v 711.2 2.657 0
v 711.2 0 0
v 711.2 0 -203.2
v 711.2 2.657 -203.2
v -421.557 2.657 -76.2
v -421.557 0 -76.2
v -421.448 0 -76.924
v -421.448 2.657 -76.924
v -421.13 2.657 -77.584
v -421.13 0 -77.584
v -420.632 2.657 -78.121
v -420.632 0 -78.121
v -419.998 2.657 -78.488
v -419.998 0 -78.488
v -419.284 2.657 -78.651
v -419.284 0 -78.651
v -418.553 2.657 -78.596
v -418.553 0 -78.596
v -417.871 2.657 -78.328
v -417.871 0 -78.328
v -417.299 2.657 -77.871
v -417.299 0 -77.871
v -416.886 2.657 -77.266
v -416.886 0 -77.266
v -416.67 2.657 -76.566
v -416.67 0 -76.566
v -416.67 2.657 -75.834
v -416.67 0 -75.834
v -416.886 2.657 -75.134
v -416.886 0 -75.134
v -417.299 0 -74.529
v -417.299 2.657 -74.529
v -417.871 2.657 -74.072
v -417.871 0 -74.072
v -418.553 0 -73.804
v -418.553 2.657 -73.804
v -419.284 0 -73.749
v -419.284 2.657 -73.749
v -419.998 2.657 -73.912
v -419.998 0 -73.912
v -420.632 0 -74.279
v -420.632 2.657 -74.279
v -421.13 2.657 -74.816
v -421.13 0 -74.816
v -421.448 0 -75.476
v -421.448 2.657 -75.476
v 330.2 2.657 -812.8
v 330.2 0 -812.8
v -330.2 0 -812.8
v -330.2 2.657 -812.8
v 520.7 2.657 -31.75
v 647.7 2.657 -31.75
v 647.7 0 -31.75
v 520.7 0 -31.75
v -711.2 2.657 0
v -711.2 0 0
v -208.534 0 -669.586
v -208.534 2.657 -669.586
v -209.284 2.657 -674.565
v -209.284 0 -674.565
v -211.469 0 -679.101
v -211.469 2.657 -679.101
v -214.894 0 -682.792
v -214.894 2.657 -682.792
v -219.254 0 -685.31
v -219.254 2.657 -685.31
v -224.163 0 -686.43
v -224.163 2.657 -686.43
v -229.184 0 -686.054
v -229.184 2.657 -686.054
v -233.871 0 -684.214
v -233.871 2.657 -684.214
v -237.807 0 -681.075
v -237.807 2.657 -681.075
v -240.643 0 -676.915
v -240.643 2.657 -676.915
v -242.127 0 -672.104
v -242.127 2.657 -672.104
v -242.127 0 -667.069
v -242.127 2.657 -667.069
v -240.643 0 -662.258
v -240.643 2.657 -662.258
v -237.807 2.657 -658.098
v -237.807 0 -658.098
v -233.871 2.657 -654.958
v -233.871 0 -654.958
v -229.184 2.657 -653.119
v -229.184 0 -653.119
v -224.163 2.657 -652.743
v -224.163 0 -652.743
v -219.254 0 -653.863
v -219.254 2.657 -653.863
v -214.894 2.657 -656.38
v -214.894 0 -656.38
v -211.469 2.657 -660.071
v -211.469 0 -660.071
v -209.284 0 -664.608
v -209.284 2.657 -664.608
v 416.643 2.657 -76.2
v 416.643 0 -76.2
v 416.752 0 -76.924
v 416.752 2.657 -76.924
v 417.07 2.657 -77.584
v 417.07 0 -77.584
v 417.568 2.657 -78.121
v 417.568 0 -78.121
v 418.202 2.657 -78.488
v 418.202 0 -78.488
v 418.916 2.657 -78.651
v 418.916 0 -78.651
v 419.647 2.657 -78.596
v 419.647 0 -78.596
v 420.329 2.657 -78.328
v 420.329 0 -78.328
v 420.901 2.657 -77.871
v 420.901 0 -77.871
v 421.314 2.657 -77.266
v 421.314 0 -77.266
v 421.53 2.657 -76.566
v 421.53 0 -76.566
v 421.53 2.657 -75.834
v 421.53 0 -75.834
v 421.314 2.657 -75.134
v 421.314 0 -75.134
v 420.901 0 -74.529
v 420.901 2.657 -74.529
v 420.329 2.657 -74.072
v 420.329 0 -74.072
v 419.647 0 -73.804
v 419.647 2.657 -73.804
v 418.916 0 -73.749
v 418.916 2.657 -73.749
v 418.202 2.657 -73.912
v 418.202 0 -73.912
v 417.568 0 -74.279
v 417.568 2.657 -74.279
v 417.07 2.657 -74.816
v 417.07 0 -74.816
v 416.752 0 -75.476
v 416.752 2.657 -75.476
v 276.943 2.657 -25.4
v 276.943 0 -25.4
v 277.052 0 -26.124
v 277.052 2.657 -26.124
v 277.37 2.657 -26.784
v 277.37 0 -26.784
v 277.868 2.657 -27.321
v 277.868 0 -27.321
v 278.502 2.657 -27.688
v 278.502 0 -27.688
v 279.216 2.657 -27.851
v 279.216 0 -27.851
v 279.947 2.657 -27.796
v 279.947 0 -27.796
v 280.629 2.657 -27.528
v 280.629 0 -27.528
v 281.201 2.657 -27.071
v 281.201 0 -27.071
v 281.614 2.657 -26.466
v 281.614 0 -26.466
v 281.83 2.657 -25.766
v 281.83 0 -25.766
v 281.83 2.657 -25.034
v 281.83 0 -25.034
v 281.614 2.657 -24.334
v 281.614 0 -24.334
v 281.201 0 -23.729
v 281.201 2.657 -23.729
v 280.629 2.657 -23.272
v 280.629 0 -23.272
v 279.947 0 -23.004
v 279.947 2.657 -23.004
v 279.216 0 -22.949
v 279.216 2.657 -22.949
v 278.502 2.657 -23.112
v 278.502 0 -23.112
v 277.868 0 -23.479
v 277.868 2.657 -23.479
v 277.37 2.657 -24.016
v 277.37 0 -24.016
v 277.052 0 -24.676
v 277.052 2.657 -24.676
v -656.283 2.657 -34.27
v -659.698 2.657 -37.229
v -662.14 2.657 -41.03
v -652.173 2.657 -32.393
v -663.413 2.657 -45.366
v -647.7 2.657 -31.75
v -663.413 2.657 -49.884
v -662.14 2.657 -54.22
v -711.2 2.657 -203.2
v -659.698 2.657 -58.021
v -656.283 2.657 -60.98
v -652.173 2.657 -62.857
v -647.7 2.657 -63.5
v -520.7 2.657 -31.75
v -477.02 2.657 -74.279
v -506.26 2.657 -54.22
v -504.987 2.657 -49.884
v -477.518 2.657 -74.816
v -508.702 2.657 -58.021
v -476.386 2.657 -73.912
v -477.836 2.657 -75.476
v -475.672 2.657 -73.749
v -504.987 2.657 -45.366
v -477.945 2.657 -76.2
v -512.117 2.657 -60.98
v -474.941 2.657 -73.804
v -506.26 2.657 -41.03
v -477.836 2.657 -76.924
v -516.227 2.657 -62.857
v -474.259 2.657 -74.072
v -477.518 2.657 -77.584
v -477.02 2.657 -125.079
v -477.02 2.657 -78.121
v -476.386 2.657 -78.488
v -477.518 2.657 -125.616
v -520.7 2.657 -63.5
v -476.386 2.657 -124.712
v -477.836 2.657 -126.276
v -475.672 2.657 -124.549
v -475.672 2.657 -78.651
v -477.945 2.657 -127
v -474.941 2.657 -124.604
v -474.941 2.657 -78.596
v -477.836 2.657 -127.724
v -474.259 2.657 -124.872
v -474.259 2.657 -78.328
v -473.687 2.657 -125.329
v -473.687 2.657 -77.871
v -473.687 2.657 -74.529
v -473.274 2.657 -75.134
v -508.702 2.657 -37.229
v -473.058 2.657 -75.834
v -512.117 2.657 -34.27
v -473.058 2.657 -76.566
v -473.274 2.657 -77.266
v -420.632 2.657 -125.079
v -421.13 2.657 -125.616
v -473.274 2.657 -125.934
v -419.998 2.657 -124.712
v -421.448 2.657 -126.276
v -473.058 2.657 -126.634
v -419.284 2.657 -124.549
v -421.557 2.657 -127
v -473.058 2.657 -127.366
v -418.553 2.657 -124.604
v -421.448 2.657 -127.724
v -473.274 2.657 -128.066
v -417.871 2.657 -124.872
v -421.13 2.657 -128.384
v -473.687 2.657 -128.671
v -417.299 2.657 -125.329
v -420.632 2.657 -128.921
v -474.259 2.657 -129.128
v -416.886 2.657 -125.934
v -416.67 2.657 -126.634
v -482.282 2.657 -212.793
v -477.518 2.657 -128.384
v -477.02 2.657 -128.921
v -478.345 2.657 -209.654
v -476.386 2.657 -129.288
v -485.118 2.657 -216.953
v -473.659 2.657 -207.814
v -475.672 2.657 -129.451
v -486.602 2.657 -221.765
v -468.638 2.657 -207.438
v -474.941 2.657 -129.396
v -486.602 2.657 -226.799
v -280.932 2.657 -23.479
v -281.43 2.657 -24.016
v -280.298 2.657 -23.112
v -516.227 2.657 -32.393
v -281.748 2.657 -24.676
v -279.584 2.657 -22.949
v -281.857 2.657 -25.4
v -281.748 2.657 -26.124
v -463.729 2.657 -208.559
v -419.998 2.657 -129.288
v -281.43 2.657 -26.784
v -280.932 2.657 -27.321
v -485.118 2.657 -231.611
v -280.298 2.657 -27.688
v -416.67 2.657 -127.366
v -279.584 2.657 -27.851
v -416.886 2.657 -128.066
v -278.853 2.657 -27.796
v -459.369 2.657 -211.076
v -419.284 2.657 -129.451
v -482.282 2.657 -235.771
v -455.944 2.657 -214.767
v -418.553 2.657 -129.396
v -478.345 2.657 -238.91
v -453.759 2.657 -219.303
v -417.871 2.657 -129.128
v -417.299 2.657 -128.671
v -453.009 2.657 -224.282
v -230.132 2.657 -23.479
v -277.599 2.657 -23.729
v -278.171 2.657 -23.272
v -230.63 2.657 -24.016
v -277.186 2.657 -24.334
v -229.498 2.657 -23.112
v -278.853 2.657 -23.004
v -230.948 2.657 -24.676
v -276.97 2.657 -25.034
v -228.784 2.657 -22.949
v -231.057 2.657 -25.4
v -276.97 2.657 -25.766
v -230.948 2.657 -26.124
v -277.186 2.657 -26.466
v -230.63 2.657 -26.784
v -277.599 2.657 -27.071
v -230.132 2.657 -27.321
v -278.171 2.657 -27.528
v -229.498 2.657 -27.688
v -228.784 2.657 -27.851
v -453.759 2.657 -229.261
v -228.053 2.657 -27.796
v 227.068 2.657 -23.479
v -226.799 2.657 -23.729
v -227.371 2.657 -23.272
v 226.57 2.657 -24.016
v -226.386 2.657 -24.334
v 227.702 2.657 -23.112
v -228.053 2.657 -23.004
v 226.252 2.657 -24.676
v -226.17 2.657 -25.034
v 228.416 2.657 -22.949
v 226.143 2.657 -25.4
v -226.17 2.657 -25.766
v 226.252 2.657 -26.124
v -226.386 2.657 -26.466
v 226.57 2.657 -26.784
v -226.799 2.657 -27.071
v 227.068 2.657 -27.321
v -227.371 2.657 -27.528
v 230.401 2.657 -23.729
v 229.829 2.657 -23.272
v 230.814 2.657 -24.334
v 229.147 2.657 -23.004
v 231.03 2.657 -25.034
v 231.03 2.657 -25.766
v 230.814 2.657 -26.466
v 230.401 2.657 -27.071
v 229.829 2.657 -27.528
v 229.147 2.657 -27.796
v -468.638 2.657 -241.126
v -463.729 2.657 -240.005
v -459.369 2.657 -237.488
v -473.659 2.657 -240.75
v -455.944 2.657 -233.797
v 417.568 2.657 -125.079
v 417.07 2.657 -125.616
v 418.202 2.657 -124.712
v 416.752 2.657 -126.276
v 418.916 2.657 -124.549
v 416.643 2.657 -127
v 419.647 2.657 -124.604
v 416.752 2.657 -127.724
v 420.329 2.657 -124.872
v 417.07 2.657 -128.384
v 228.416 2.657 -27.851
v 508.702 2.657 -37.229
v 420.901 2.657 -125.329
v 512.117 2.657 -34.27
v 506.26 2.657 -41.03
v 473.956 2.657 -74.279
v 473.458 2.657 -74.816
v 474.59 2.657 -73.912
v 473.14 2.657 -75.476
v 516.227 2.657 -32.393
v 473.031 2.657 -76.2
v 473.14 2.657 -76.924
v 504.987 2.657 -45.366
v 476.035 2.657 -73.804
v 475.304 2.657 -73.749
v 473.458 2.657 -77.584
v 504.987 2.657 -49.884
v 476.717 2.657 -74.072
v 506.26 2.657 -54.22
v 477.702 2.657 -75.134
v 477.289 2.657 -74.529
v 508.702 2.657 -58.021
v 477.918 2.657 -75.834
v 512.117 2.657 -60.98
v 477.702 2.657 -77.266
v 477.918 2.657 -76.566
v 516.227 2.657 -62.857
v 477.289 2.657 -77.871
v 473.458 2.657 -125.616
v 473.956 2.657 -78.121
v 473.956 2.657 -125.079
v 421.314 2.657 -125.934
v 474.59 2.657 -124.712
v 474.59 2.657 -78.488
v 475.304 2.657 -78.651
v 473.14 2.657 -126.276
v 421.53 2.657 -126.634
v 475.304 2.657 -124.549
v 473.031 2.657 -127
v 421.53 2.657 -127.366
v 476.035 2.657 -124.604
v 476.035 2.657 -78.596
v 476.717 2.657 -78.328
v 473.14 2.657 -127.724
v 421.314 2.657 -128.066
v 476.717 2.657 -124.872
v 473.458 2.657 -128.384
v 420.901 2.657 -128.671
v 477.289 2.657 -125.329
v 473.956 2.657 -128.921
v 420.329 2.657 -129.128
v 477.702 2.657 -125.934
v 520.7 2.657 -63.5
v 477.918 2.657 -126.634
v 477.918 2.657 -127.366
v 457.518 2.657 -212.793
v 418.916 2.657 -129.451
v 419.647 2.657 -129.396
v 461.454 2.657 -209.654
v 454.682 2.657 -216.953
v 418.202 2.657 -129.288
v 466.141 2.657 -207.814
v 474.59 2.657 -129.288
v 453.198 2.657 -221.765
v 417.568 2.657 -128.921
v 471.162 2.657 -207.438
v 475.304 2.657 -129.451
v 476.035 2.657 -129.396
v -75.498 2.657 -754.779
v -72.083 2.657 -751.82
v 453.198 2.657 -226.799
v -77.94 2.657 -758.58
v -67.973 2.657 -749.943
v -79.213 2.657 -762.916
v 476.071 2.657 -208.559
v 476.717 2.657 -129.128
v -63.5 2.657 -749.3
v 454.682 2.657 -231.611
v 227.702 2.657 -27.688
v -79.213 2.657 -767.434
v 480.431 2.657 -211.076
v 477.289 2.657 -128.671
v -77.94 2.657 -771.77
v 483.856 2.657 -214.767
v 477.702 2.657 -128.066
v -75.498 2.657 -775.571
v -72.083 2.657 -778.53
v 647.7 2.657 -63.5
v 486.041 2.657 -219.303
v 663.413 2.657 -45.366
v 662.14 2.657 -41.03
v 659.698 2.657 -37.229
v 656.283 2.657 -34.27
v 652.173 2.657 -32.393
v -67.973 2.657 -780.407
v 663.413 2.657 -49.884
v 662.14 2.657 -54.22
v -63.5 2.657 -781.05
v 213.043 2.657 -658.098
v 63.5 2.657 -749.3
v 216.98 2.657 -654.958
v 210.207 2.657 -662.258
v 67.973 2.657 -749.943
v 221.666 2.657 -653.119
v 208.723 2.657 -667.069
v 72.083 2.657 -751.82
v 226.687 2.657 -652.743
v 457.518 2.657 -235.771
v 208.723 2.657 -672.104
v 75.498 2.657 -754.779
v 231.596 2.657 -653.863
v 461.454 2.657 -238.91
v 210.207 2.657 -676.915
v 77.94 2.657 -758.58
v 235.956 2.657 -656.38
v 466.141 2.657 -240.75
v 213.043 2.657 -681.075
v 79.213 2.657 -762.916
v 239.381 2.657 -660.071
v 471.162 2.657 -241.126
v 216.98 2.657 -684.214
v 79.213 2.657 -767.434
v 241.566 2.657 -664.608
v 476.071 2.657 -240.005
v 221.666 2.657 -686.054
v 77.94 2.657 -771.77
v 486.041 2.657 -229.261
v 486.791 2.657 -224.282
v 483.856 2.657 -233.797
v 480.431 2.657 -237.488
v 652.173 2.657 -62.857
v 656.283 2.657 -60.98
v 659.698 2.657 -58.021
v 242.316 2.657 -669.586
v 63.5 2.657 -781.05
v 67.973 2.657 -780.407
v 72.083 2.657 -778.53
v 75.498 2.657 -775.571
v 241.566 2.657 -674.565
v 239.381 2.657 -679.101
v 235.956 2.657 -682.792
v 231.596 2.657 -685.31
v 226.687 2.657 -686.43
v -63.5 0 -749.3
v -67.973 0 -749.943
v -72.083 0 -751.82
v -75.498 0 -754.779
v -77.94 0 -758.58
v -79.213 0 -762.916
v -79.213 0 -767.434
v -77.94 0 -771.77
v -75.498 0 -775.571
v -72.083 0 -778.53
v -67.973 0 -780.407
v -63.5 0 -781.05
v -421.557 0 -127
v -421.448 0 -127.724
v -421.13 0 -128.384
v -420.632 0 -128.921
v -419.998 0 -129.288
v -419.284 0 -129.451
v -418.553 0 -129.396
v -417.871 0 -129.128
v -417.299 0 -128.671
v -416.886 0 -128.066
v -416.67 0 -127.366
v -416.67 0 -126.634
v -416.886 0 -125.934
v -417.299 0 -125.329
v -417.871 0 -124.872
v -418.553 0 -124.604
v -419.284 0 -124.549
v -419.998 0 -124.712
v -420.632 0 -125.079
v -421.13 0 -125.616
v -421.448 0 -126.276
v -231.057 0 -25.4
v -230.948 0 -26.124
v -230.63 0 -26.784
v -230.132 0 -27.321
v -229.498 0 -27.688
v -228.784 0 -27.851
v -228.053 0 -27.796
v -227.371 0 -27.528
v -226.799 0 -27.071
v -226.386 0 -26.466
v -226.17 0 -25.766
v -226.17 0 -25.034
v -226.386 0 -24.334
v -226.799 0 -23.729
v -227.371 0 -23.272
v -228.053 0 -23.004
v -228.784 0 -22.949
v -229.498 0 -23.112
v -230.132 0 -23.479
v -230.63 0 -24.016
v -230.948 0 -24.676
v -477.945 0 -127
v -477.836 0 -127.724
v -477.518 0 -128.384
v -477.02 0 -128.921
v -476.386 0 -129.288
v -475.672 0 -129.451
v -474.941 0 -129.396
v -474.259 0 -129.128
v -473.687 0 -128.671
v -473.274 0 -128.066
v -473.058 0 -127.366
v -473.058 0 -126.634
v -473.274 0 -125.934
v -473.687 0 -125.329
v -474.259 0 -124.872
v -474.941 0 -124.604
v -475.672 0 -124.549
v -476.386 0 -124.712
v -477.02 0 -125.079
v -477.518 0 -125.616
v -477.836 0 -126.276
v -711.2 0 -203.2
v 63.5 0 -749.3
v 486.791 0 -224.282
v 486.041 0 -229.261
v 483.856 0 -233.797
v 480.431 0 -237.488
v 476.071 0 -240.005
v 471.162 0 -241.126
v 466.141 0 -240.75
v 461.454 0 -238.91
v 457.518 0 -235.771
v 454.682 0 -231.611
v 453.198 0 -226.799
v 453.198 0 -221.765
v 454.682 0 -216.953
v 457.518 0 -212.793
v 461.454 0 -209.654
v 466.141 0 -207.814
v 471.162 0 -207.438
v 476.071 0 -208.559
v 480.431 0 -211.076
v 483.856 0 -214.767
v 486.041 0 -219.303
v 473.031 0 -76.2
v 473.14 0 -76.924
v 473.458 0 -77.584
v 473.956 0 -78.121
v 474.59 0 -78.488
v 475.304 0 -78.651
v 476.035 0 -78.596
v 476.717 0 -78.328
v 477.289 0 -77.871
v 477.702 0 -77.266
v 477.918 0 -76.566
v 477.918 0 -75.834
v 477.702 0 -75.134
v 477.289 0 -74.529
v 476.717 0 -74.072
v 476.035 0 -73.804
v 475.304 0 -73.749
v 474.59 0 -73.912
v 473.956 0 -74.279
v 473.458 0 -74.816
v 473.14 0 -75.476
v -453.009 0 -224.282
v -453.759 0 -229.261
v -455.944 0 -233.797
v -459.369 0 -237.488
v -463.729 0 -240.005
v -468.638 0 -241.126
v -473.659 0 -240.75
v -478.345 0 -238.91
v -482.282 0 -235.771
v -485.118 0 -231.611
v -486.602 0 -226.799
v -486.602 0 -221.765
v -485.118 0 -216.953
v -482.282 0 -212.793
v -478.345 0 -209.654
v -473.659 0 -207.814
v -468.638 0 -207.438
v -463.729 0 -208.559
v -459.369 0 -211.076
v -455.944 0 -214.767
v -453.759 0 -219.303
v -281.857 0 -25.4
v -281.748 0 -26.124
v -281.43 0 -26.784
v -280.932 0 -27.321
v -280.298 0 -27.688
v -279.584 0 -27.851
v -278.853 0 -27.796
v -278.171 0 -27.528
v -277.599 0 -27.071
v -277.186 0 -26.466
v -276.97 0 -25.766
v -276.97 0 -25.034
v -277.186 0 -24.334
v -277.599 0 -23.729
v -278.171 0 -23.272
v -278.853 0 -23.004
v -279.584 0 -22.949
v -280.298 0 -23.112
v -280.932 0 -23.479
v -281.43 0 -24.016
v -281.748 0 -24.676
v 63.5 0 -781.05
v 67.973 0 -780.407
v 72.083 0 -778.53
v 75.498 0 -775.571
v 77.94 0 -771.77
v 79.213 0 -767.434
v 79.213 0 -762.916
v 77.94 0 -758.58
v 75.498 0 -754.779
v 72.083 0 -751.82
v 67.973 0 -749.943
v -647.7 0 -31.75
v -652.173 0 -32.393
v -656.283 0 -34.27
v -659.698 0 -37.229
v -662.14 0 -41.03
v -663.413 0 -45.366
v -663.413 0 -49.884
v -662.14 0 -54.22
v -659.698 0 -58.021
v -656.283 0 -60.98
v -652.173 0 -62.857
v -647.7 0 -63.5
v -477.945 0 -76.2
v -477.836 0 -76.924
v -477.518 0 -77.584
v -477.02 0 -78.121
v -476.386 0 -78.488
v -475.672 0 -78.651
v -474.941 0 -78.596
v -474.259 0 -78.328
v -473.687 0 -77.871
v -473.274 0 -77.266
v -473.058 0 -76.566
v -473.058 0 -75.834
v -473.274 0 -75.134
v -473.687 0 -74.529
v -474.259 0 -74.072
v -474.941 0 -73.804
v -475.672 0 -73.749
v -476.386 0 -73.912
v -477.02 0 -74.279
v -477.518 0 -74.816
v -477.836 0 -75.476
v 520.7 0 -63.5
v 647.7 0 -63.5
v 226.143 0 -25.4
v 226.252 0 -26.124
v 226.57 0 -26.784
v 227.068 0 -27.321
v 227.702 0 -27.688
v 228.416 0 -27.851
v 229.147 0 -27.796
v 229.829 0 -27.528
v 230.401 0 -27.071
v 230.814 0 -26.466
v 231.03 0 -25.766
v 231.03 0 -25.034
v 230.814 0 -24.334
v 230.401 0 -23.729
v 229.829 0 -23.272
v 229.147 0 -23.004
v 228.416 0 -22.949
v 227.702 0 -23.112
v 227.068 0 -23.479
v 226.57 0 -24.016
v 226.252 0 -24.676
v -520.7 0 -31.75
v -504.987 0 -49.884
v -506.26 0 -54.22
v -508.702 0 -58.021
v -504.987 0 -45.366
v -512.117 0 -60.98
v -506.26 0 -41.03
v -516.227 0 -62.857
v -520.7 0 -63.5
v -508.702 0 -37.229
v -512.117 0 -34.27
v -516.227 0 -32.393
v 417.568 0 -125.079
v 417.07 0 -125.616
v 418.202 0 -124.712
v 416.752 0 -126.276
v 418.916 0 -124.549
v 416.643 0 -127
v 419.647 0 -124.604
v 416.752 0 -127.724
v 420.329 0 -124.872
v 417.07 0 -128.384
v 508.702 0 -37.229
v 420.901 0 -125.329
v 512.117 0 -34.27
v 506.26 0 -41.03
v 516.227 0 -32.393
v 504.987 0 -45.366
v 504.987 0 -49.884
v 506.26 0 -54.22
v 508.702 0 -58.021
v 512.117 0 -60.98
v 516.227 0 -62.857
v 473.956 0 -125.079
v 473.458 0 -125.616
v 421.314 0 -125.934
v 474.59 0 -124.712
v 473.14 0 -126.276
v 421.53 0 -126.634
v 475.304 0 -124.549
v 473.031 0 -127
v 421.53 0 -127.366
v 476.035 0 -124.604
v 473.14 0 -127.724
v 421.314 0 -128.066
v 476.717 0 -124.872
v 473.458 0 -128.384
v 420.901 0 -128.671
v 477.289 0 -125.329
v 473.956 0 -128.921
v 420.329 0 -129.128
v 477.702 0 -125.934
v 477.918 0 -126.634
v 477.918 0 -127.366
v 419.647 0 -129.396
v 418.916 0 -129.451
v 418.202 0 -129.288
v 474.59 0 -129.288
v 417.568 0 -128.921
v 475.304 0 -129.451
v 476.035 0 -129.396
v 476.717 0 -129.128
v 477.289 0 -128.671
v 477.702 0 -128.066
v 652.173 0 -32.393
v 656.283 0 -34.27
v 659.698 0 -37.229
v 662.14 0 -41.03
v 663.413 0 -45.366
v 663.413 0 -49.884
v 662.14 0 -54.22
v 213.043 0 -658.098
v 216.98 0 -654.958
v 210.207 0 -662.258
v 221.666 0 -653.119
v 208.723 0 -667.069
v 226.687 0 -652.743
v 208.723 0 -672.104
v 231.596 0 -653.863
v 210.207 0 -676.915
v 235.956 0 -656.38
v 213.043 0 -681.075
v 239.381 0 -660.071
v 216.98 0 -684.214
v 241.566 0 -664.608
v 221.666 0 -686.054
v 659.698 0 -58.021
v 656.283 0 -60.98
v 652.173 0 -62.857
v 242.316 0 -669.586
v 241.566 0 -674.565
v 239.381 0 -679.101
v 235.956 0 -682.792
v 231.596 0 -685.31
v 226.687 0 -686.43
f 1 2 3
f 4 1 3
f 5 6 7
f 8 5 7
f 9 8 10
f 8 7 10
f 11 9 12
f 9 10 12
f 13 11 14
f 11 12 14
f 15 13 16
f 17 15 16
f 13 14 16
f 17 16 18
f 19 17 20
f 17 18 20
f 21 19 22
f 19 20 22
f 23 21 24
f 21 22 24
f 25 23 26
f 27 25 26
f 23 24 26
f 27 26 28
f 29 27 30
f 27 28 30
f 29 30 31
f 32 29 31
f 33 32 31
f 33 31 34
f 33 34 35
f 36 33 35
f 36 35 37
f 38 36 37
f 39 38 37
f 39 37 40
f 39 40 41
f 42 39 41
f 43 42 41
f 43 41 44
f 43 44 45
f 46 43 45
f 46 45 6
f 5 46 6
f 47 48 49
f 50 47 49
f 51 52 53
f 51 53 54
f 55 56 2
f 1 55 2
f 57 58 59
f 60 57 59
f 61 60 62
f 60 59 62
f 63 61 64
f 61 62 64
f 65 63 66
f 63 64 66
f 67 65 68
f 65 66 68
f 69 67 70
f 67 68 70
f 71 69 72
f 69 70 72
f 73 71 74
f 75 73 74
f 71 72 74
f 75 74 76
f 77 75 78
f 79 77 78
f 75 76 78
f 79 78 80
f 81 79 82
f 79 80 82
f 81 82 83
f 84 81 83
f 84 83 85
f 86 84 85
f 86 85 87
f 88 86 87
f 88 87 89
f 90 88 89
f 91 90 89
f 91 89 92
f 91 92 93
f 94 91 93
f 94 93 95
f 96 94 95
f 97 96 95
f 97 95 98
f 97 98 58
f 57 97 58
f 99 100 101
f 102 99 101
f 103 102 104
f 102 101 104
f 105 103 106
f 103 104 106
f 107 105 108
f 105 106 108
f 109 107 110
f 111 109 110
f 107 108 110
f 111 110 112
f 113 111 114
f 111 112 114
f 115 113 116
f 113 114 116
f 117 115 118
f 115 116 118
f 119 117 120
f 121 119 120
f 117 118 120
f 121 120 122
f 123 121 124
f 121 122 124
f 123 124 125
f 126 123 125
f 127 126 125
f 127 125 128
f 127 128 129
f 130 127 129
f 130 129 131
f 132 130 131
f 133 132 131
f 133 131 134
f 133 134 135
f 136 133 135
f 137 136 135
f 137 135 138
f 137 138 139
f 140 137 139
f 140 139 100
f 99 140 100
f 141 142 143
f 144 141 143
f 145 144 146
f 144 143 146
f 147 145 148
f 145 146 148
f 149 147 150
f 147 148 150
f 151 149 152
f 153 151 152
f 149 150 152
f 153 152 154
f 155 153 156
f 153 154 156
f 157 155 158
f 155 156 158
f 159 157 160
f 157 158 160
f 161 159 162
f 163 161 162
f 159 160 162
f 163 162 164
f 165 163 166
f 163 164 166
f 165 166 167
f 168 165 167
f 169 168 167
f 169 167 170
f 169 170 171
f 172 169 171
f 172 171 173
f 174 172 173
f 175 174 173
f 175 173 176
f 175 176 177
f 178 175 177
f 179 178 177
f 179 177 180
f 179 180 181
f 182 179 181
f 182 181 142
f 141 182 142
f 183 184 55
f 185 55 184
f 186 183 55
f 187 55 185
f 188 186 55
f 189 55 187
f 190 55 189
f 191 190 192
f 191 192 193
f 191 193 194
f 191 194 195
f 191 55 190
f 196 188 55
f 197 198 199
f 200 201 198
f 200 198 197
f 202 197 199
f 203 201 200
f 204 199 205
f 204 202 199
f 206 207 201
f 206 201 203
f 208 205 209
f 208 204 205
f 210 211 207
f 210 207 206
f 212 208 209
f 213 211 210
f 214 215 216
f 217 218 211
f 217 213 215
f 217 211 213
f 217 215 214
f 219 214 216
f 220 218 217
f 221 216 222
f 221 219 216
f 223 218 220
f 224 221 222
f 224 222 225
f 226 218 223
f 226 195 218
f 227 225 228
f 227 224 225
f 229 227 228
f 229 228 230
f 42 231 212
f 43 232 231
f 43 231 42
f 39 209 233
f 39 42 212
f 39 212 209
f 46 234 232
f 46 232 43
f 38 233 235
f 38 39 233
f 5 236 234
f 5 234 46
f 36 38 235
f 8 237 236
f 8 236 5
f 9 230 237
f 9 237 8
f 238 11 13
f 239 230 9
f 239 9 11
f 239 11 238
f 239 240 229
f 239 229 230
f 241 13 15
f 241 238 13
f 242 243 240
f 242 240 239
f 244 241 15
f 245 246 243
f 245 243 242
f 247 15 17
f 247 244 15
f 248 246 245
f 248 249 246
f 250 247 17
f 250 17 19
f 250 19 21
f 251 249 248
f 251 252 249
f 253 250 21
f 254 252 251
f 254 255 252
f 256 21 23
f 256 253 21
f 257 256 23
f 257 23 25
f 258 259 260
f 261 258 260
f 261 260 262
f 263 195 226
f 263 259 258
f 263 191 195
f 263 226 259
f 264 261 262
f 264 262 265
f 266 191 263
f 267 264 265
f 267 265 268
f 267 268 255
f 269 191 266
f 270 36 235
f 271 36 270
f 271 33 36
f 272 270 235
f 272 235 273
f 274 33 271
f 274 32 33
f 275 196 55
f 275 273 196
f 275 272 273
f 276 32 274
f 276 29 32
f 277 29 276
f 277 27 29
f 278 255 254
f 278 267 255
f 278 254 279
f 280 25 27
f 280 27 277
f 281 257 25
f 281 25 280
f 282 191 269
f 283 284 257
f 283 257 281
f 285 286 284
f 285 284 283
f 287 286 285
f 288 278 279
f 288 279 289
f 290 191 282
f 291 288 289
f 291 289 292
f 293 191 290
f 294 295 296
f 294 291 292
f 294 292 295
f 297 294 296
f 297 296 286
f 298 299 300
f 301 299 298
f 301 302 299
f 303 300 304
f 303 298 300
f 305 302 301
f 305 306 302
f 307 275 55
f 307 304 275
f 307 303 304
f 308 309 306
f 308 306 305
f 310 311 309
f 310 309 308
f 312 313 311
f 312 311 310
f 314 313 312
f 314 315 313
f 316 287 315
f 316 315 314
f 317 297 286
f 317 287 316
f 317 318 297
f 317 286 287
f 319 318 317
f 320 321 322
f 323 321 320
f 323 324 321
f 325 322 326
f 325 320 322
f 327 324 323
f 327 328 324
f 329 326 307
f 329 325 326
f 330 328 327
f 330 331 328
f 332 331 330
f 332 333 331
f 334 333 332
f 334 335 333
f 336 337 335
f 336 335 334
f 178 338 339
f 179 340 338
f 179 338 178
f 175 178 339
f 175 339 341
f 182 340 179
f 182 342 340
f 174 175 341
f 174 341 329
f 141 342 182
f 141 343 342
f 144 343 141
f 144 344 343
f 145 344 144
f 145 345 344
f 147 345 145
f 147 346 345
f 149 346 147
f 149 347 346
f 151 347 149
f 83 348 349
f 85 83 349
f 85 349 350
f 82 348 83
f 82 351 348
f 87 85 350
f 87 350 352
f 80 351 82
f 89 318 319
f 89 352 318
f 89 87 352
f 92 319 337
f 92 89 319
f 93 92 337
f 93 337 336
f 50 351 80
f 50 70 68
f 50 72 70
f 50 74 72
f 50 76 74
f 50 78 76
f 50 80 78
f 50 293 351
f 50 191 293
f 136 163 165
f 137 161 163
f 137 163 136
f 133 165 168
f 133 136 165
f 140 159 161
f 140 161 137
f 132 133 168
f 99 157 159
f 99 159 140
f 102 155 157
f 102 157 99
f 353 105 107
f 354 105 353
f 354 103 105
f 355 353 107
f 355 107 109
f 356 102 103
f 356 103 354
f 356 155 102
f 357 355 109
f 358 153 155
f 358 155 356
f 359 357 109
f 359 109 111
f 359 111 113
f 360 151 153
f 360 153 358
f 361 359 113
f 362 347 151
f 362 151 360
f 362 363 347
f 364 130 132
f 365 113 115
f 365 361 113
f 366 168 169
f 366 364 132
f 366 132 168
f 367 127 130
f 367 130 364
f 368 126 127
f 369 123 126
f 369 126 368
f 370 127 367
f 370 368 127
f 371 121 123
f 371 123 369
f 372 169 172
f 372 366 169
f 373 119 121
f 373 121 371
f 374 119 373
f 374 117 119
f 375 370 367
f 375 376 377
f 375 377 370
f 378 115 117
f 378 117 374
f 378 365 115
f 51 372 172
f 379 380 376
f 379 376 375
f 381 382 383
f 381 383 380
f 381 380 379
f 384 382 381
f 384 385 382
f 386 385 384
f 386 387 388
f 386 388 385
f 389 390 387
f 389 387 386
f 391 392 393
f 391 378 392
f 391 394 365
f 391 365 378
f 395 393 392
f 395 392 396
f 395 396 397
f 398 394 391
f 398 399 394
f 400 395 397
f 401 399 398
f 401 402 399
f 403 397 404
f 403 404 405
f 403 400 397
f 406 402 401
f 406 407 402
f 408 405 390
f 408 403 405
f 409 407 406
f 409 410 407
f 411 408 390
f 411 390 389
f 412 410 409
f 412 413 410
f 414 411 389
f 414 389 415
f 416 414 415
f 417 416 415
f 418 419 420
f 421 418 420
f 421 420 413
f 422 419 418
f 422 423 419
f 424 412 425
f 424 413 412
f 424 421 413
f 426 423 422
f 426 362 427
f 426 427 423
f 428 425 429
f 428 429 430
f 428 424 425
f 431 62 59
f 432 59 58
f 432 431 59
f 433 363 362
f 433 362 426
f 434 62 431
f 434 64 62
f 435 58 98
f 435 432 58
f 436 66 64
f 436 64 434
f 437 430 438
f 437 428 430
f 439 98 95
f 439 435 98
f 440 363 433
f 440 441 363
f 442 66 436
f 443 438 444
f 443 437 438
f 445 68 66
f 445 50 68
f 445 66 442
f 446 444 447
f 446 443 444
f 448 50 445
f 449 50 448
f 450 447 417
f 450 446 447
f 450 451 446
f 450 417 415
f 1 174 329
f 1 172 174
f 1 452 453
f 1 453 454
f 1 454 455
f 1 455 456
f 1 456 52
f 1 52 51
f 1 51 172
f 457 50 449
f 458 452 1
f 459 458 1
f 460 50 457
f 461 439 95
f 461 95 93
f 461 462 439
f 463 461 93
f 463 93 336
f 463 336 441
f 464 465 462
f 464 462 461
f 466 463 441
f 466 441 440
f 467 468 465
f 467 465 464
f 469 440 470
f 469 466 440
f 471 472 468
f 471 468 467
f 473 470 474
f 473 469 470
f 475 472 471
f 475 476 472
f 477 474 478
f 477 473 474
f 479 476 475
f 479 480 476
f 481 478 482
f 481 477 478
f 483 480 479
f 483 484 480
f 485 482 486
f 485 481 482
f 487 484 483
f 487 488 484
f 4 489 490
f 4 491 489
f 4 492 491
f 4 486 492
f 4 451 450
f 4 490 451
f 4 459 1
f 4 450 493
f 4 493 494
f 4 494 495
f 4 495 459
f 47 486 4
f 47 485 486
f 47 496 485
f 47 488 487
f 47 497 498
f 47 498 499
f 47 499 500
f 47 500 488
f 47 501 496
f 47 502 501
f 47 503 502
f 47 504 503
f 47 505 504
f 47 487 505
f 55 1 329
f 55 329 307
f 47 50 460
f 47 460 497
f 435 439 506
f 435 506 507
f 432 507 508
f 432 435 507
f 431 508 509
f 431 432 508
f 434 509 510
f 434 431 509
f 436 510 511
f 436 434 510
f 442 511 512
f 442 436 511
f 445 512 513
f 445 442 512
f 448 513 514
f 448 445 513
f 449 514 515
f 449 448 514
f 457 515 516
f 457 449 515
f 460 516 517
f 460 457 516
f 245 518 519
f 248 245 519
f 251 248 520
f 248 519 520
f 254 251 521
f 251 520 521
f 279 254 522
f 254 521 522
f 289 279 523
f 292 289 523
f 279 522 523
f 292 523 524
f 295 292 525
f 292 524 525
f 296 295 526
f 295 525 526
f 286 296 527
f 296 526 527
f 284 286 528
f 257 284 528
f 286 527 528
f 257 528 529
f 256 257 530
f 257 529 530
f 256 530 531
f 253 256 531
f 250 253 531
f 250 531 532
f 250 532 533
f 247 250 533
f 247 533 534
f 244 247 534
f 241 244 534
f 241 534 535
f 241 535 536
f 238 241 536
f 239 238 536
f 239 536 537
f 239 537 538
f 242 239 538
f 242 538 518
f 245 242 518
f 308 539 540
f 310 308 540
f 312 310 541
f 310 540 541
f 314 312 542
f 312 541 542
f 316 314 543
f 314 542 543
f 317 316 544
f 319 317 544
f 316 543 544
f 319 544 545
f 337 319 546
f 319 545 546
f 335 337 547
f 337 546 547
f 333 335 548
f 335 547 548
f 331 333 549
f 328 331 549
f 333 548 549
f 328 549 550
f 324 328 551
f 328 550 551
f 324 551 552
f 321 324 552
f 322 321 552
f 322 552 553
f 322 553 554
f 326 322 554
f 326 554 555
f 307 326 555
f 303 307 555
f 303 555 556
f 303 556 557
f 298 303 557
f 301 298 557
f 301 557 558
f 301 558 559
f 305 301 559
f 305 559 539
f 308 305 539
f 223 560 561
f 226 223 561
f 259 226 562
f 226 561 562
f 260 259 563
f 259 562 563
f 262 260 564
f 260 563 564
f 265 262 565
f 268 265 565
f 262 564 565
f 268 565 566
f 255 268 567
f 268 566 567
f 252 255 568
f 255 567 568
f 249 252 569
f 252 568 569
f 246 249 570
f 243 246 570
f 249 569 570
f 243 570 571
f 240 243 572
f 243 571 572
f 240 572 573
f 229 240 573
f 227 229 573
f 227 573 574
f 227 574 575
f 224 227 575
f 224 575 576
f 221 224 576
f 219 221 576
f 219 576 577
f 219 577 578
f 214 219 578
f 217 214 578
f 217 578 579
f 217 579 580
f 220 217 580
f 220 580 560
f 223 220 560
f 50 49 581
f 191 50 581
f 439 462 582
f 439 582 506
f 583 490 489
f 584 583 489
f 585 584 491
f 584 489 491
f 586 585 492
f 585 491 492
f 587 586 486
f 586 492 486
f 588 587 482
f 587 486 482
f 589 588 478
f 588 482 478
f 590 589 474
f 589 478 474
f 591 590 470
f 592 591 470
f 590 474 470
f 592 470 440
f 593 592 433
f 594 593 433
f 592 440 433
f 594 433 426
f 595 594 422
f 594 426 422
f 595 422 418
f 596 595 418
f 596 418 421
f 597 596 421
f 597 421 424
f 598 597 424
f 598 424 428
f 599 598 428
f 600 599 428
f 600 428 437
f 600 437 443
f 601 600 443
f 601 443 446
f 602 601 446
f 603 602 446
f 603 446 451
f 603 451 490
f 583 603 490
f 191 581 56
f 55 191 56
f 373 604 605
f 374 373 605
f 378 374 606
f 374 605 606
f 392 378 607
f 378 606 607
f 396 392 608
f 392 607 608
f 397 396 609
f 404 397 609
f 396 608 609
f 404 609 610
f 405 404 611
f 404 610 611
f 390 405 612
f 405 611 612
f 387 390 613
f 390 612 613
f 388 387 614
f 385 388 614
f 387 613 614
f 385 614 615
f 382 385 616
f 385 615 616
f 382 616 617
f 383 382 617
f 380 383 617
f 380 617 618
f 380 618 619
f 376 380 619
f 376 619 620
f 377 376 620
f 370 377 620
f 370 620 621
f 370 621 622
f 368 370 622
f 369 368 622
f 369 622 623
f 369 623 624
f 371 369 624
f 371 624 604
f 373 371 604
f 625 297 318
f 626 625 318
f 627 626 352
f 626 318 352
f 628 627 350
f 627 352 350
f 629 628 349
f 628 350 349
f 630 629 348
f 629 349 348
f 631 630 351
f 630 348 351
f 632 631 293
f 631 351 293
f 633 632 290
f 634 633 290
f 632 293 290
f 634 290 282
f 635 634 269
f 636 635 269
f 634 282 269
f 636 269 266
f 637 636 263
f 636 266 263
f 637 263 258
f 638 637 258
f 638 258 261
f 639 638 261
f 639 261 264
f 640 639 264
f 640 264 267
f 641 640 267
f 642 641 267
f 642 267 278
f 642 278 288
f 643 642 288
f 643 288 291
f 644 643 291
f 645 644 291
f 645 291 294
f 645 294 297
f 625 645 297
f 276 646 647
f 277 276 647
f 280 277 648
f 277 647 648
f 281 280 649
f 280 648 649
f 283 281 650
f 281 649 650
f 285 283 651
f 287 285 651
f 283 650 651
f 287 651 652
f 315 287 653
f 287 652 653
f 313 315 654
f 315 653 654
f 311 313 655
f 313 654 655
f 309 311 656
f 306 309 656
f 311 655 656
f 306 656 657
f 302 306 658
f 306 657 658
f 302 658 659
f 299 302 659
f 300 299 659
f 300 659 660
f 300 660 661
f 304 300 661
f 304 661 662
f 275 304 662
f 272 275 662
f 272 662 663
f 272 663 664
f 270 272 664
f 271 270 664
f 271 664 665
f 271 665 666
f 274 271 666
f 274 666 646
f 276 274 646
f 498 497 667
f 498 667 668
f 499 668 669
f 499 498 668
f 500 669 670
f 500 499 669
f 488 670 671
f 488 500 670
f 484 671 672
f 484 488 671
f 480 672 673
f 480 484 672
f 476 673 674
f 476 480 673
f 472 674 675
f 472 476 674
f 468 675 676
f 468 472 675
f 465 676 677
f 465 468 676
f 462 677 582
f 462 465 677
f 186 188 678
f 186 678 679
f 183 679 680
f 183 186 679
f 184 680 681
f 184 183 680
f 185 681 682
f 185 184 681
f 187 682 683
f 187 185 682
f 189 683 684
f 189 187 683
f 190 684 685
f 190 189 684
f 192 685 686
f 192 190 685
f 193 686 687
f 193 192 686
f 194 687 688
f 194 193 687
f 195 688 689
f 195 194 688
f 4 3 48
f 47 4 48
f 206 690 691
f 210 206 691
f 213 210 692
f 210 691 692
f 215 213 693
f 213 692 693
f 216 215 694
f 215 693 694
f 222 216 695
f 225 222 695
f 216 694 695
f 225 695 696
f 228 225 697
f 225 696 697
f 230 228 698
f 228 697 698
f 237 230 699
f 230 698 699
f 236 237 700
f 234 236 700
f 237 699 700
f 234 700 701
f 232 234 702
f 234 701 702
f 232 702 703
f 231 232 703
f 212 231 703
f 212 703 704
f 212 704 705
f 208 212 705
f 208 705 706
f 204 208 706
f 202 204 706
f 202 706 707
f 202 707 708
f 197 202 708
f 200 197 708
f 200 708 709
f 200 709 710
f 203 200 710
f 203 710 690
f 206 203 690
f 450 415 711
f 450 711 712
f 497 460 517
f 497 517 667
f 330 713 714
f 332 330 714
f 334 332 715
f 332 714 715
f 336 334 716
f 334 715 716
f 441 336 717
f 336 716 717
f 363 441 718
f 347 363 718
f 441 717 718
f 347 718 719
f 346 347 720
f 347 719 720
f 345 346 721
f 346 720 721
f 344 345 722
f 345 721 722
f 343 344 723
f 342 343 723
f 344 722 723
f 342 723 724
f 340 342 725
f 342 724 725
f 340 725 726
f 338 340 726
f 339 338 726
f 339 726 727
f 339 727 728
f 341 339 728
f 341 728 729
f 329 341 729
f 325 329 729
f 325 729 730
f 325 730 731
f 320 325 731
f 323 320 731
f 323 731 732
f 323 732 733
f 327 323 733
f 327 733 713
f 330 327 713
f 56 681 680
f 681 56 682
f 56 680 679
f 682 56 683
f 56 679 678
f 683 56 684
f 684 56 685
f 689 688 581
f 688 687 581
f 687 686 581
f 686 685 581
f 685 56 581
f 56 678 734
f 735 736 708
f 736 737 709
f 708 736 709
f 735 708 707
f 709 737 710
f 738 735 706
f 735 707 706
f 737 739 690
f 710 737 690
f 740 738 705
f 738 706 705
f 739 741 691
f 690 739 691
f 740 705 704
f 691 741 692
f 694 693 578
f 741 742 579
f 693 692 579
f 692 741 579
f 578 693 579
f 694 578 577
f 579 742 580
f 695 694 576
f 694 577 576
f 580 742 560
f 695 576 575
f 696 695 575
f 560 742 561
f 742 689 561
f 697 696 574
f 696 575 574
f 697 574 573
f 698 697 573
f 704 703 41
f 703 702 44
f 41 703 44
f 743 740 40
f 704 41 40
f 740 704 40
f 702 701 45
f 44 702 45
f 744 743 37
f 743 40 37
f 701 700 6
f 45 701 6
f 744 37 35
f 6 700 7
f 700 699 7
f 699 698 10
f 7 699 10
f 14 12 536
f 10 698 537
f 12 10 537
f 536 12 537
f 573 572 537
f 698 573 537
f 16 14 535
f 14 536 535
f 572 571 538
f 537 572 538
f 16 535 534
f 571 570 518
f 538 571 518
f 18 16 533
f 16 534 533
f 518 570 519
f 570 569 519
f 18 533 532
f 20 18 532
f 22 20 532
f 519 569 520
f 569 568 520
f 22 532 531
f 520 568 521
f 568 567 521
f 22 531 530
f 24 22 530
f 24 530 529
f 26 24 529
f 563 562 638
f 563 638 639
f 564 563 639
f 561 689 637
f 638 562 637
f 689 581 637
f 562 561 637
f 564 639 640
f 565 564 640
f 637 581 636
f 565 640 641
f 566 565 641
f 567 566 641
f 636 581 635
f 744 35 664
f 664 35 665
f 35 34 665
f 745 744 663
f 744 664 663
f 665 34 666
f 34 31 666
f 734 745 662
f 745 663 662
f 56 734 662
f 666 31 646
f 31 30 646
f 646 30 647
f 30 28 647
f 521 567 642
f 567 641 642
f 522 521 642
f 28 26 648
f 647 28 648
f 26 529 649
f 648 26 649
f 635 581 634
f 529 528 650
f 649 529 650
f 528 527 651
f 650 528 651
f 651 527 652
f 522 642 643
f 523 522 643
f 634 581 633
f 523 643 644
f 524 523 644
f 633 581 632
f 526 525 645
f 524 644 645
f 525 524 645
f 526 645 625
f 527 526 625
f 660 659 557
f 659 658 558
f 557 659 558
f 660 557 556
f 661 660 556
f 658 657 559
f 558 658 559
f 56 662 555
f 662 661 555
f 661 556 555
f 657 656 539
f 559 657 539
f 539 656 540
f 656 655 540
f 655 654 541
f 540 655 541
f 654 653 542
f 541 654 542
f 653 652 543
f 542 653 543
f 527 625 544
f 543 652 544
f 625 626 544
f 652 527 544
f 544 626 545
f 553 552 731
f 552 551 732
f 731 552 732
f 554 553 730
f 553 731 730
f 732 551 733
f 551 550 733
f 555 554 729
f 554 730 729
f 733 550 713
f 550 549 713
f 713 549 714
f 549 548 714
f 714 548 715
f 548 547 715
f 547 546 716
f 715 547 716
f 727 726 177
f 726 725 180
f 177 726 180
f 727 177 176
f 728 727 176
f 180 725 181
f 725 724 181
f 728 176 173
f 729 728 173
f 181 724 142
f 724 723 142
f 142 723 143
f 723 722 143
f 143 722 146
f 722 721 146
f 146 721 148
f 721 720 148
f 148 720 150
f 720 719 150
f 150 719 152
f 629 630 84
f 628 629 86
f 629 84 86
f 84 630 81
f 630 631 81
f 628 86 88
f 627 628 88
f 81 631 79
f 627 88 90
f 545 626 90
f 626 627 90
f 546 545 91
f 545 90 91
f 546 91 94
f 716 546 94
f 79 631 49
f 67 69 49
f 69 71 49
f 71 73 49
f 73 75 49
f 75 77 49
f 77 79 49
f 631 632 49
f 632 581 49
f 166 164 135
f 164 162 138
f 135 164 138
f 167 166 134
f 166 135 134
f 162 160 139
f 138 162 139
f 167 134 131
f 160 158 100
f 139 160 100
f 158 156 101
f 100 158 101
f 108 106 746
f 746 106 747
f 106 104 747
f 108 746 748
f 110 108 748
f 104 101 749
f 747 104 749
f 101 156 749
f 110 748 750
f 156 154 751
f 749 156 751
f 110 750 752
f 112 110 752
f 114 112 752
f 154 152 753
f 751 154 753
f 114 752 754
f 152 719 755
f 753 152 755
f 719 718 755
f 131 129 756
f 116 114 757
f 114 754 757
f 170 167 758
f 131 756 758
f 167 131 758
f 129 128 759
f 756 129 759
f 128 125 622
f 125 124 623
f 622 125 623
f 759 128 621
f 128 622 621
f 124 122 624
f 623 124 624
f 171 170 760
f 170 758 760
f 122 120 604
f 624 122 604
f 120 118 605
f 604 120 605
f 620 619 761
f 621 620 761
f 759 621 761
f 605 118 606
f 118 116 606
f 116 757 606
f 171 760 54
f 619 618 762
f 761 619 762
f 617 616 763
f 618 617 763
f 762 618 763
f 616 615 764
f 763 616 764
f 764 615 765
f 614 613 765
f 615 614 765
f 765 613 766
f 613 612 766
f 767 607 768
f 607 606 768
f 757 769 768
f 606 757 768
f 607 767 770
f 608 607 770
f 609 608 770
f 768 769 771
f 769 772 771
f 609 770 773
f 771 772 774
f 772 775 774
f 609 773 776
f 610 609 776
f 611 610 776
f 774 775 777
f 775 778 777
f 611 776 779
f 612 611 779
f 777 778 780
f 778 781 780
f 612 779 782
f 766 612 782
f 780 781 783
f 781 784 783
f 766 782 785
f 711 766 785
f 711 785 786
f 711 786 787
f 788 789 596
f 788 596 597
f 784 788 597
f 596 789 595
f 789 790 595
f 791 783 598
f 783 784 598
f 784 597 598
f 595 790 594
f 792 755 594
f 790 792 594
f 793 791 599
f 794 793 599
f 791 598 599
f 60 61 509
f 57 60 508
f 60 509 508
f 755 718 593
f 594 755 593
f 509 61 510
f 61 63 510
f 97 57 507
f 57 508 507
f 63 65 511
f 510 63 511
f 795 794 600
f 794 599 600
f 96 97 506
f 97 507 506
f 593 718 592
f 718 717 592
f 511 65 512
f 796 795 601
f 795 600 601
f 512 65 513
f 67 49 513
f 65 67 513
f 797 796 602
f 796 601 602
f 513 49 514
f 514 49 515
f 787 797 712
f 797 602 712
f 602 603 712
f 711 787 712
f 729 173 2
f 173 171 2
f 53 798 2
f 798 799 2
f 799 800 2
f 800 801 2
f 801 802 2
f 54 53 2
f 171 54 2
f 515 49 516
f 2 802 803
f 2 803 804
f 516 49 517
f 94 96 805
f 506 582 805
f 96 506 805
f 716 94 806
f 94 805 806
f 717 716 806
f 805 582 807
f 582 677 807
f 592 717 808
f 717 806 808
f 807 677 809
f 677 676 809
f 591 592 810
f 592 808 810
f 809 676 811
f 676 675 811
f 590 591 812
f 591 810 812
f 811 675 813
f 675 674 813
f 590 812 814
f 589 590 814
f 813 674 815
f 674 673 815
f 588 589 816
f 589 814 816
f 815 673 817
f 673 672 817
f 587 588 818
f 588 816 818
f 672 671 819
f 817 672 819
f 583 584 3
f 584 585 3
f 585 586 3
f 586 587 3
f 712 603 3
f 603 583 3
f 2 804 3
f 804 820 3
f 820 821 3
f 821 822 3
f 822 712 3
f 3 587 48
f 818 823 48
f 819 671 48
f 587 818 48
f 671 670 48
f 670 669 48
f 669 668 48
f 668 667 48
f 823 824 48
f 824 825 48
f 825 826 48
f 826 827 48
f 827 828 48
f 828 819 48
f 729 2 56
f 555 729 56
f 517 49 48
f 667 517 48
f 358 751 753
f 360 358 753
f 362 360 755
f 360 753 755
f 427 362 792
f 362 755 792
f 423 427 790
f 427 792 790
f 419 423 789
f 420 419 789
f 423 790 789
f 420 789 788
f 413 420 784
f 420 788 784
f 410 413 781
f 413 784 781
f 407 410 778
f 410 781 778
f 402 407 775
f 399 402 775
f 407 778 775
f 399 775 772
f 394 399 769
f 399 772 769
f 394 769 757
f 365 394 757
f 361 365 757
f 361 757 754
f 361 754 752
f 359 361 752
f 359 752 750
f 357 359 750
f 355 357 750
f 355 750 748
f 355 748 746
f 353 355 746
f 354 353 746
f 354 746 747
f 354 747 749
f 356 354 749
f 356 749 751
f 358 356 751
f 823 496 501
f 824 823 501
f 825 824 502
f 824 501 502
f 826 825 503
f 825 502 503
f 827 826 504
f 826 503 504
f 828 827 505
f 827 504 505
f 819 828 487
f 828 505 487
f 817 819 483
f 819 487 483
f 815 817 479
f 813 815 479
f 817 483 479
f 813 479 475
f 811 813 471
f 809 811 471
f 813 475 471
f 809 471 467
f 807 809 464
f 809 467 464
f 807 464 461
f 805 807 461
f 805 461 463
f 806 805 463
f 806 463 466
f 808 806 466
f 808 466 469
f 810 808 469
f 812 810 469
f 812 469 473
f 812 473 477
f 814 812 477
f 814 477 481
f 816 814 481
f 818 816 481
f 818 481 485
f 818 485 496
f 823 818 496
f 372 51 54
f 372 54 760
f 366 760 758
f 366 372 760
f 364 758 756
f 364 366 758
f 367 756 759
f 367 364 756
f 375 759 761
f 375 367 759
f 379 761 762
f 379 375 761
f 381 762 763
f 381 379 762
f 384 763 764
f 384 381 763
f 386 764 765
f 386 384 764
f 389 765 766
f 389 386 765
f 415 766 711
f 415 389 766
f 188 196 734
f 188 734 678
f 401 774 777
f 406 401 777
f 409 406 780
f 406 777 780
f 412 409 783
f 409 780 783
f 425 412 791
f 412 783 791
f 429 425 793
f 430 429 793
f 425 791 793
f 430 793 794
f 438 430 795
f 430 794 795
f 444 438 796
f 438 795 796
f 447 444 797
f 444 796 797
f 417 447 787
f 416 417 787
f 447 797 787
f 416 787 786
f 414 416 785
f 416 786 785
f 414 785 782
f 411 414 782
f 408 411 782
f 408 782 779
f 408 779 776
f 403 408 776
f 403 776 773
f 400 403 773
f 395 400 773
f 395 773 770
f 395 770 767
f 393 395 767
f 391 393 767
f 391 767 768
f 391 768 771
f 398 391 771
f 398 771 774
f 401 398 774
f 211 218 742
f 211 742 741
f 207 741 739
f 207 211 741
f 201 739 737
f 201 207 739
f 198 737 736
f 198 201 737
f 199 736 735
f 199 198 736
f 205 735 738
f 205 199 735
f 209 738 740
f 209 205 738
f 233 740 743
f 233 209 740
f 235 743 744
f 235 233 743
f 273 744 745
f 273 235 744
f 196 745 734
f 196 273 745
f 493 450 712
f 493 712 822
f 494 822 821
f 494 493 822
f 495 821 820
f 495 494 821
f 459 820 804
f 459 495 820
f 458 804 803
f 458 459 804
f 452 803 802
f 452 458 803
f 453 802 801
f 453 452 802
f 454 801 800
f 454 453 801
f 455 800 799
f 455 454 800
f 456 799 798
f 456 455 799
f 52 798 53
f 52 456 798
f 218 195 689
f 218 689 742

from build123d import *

# Parameters (mm, degrees)
BOSS_EXTRUDE1_DEPTH          = 2.65684
CUT_EXTRUDE1_DEPTH           = 3.65684
SKETCH3_R                    = 16.891
CUT_EXTRUDE2_DEPTH           = 3.65684
F_10_0_1935_DIAMETER_HOLE1_D = 4.9149


with BuildPart() as part:
    # Sketch1 → Boss-Extrude1 (new body)
    with BuildSketch(Plane(origin=(0, 0, 0), x_dir=(1, 0, 0), z_dir=(0, 1, 0))):
        Polygon((-711.2, 203.2), (-711.2, 0), (711.2, 0), (711.2, 203.2), (330.2, 812.8), (-330.2, 812.8), align=None)
    extrude(amount=BOSS_EXTRUDE1_DEPTH)

    # Sketch2 → Cut-Extrude1 (cut, through all)
    with BuildSketch(Plane(origin=(0, 2.65684, 0), x_dir=(1, 0, 0), z_dir=(0, 1, 0))):
        with BuildLine():
            Line((-63.5, 781.05), (63.5, 781.05))
            ThreePointArc((63.5, 781.05), (79.375, 765.175), (63.5, 749.3))
            Line((63.5, 749.3), (-63.5, 749.3))
            ThreePointArc((-63.5, 749.3), (-79.375, 765.175), (-63.5, 781.05))
        make_face()
        with BuildLine():
            Line((-647.7, 63.5), (-520.7, 63.5))
            ThreePointArc((-520.7, 63.5), (-504.825, 47.625), (-520.7, 31.75))
            Line((-520.7, 31.75), (-647.7, 31.75))
            ThreePointArc((-647.7, 31.75), (-663.575, 47.625), (-647.7, 63.5))
        make_face()
        with BuildLine():
            Line((520.7, 63.5), (647.7, 63.5))
            ThreePointArc((647.7, 63.5), (663.575, 47.625), (647.7, 31.75))
            Line((647.7, 31.75), (520.7, 31.75))
            ThreePointArc((520.7, 31.75), (504.825, 47.625), (520.7, 63.5))
        make_face()
    extrude(amount=-CUT_EXTRUDE1_DEPTH, mode=Mode.SUBTRACT)

    # Sketch3 → Cut-Extrude2 (cut, through all)
    with BuildSketch(Plane(origin=(0, 2.65684, 0), x_dir=(1, 0, 0), z_dir=(0, 1, 0))):
        with Locations((-469.9, 224.282)):
            Circle(SKETCH3_R)
        with Locations((-225.425, 669.586361505)):
            Circle(SKETCH3_R)
        with Locations((225.425, 669.586361505)):
            Circle(SKETCH3_R)
        with Locations((469.9, 224.282)):
            Circle(SKETCH3_R)
    extrude(amount=-CUT_EXTRUDE2_DEPTH, mode=Mode.SUBTRACT)

    # #10 (0.1935) Diameter Hole1 (through all)
    with Locations(Plane(origin=(0, 2.65684, 0), x_dir=(1, 0, 0), z_dir=(0, 1, 0))):
        with Locations((228.6, 25.4), (279.4, 25.4), (419.1, 76.2), (419.1, 127), (475.488, 76.2), (475.488, 127), (-475.488, 127), (-475.488, 76.2), (-419.1, 76.2), (-419.1, 127), (-279.4, 25.4), (-228.6, 25.4)):
            Hole(F_10_0_1935_DIAMETER_HOLE1_D / 2)


solid = part.part
